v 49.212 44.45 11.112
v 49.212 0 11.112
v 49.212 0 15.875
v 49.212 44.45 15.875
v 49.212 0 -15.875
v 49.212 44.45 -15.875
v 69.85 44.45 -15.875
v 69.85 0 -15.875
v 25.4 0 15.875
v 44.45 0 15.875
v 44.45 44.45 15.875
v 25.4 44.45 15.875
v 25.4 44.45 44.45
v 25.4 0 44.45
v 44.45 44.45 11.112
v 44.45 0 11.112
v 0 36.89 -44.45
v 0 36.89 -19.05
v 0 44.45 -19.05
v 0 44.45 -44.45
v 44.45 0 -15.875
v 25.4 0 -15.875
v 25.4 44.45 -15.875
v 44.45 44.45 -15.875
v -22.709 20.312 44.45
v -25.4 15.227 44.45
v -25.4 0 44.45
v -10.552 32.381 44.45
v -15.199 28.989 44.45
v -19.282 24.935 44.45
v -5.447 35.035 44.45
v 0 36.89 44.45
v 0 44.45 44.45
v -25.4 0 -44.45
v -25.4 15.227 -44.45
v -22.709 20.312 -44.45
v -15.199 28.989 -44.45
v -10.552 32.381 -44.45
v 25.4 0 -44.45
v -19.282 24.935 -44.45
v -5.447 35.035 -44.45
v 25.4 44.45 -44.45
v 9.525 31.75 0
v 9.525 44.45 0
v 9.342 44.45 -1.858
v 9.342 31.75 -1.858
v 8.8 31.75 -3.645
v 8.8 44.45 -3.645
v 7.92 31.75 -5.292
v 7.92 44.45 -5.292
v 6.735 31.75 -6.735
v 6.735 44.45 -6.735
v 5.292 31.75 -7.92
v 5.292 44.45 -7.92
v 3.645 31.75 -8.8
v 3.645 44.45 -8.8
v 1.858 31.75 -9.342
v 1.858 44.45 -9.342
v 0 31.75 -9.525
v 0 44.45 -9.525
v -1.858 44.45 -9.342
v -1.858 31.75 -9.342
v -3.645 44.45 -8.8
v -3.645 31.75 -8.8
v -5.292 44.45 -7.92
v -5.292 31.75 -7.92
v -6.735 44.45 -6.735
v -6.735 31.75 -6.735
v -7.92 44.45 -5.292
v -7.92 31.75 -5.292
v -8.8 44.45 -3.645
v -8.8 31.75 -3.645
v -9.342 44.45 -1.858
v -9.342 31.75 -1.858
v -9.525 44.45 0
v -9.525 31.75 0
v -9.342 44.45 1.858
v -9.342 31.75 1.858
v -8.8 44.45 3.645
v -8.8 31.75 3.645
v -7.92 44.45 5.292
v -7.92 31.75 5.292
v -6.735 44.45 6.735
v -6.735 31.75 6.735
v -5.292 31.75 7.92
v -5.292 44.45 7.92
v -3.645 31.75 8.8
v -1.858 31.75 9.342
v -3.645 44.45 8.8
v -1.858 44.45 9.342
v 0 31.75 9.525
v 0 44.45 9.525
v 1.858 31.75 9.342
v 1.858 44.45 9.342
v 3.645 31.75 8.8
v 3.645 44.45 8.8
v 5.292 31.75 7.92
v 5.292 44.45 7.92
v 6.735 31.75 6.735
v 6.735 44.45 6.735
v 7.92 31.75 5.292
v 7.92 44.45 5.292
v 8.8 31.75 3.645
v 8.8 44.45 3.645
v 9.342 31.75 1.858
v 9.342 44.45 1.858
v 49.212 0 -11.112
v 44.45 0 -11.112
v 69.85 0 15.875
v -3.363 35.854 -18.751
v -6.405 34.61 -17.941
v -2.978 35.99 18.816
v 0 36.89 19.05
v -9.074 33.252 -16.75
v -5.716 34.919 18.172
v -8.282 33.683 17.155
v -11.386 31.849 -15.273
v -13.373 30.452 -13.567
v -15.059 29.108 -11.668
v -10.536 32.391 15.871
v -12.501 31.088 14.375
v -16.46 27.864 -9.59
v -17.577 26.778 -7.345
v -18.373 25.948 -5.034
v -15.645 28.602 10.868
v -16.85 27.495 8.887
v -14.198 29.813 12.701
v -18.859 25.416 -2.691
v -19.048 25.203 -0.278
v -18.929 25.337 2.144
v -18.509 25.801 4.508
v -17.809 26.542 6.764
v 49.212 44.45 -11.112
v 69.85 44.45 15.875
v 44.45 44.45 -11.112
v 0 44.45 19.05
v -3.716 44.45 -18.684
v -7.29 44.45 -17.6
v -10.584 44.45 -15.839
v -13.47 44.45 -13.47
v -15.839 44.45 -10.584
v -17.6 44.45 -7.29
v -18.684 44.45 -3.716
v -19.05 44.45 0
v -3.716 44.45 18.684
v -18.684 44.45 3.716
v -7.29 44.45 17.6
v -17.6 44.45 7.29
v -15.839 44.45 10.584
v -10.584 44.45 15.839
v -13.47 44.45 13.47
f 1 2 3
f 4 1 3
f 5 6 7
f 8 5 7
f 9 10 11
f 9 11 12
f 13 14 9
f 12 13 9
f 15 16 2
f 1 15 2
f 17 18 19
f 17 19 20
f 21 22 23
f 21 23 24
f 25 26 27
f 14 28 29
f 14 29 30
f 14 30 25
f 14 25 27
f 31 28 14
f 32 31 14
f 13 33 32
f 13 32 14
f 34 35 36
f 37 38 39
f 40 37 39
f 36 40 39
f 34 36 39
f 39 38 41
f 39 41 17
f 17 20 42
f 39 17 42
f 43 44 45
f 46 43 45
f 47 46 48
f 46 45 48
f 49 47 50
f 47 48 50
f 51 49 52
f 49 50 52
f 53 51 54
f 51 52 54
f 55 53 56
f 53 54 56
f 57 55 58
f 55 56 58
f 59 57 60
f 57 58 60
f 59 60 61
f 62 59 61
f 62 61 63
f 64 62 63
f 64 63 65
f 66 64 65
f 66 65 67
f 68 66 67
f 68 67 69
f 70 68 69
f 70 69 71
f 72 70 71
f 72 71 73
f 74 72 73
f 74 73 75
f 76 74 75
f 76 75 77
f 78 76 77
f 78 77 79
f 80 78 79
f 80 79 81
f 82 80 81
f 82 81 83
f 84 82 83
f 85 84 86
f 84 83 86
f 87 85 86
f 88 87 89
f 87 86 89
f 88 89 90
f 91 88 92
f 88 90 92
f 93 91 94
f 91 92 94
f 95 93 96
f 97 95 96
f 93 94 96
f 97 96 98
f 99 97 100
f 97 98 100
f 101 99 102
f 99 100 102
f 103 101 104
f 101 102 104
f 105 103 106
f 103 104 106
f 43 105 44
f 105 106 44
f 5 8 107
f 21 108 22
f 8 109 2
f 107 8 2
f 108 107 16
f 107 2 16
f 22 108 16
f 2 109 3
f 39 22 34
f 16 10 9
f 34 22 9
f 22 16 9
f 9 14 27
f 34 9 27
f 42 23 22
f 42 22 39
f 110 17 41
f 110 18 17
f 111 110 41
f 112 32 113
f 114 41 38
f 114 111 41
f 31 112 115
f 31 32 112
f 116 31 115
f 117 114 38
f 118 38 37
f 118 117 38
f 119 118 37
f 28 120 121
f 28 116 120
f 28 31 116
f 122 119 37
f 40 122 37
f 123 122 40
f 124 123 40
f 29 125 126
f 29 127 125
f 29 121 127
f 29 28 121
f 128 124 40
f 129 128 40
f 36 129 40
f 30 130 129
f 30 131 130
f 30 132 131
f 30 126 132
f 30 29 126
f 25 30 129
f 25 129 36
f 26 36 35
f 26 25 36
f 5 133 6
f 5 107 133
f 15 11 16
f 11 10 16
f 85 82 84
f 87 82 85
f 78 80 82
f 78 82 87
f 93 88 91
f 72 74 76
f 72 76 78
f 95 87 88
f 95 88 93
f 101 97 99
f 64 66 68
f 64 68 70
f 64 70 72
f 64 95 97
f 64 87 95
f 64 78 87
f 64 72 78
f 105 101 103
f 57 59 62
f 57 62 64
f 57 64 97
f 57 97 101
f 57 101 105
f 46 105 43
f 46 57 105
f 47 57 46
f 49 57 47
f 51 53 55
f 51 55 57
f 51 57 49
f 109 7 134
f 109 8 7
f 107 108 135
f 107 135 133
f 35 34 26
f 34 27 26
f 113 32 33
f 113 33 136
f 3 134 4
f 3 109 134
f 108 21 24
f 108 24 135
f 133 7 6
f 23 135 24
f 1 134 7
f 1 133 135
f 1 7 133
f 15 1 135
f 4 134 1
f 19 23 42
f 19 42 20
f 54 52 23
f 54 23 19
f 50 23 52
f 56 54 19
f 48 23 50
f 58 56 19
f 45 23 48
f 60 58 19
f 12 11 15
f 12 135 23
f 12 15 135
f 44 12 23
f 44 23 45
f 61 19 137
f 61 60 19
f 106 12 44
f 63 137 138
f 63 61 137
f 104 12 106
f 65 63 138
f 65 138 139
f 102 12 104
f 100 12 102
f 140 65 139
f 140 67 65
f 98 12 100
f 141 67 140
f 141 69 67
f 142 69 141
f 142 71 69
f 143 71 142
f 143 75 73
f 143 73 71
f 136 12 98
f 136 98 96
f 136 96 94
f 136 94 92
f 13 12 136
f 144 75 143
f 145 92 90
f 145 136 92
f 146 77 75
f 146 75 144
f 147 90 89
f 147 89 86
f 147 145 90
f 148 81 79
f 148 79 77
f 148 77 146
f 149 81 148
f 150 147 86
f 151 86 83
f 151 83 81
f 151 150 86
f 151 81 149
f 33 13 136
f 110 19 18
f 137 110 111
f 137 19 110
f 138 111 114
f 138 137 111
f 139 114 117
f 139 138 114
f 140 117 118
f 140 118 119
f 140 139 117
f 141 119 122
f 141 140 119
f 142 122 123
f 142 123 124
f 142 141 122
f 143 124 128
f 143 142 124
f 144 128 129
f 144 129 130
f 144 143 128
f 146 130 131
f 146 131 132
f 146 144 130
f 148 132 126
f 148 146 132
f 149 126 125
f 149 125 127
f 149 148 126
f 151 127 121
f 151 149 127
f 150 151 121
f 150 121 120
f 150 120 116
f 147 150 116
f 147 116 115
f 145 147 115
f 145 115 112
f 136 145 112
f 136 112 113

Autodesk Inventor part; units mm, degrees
ref_plane "YZ Plane" through (0, 0, 0) normal (1, 0, 0) x (0, 1, 0)
ref_plane "XZ Plane" through (0, 0, 0) normal (0, 1, 0) x (-1, 0, 0)
ref_plane "XY Plane" through (0, 0, 0) normal (0, 0, 1) x (1, 0, 0)
sketch "Boceto1" plane through (0, 0, 0) normal (0, 1, 0) x (-1, 0, 0)
  line L0 (25.4, 44.45) -> (-25.4, 44.45)
  line L1 (-25.4, 44.45) -> (-25.4, -44.45)
  line L2 (-25.4, -44.45) -> (25.4, -44.45)
  line L3 (25.4, -44.45) -> (25.4, 44.45)
  line L4 (25.4, 44.45) -> (-25.4, -44.45) construction
  line L5 (-25.4, 44.45) -> (25.4, -44.45) construction
  line L6 (-25.4, -15.875) -> (-69.85, -15.875)
  line L7 (-69.85, -15.875) -> (-69.85, 15.875)
  line L8 (-69.85, 15.875) -> (-25.4, 15.875)
  line L9 (-25.4, 15.875) -> (-25.4, -15.875)
  line L10 (-25.4, 44.45) -> (0, 44.45)
  line L11 (0, 44.45) -> (0, -44.45)
  line L12 (0, -44.45) -> (-25.4, -44.45)
  line L13 (-25.4, -44.45) -> (-25.4, 44.45)
  line L14 (-25.4, 15.875) -> (-43.4008, 15.875)
  line L15 (-25.4, 15.875) -> (-44.45, 15.875)
  line L16 (-44.45, 15.875) -> (-49.2125, 15.875)
  line L17 (-49.2125, 15.875) -> (-44.45, 15.875)
  line L18 (-44.45, 15.875) -> (-44.45, 11.1125)
  line L19 (-44.45, 11.1125) -> (-49.2125, 11.1125)
  line L20 (-49.2125, 11.1125) -> (-49.2125, 15.875)
  line L21 (-49.2125, -15.875) -> (-44.45, -15.875)
  line L22 (-44.45, -15.875) -> (-44.45, -11.1125)
  line L23 (-44.45, -11.1125) -> (-49.2125, -11.1125)
  line L24 (-49.2125, -11.1125) -> (-49.2125, -15.875)
  point P0 (0, 0)
  dimension "d0" = 28.575
  dimension "d1" = 28.575
  dimension "d2" = 31.75
  dimension "d3" = 50.8
  dimension "d4" = 44.45
  dimension "d5" = 19.05
  dimension "d6" = 4.7625
  dimension "d7" = 4.7625
  dimension "d8" = 4.7625
  dimension "d9" = 4.7625
  dimension "d10" = 19.05
extrude "Extrusión1" add sketch "Boceto1" along normal blind 44.45 contours L11 L2 L1 L0 | L1 L6 L22 L23 L24 L7 L8 L20 L19 L18
sketch "Boceto2" plane through (0, 0, 44.45) normal (0, 0, 1) x (1, 0, 0)
  line L0 (0, 0) -> (25.4, 0) projected
  line L1 (25.4, 0) -> (9.525, 0)
  circle A0 centre (9.525, 0) radius 38.1
  line L2 (25.4, 0) -> (-25.4, 0)
  line L3 (-25.4, 0) -> (-25.4, 15.2268)
  line L4 (0, 0) -> (0, 36.8902)
  dimension "d13" = 15.875
  dimension "d14" = 76.2
  dimension "d15" = 50.8
extrude "Extrusión2" add sketch "Boceto2" against normal blind 88.9 contours L4 L2 L3 A0 picked at (-16.9333, 5.0756)
sketch "Boceto3" plane through (0, 44.45, 0) normal (0, 1, 0) x (1, 0, 0)
  circle A0 centre (0, 0) radius 19.05
  circle A1 centre (0, 0) radius 9.525
  dimension "d18" = 38.1
  dimension "d19" = 19.05
extrude "Extrusión3" add sketch "Boceto3" against normal blind 25.4
sketch "Boceto4" plane through (0, 44.45, 0) normal (0, 1, 0) x (1, 0, 0)
  circle A0 centre (0, 0) radius 9.525
  dimension "d22" = 19.05
extrude "Extrusión4" cut sketch "Boceto4" against normal blind 12.7
properties part number "Pieza6-Tarea1"
